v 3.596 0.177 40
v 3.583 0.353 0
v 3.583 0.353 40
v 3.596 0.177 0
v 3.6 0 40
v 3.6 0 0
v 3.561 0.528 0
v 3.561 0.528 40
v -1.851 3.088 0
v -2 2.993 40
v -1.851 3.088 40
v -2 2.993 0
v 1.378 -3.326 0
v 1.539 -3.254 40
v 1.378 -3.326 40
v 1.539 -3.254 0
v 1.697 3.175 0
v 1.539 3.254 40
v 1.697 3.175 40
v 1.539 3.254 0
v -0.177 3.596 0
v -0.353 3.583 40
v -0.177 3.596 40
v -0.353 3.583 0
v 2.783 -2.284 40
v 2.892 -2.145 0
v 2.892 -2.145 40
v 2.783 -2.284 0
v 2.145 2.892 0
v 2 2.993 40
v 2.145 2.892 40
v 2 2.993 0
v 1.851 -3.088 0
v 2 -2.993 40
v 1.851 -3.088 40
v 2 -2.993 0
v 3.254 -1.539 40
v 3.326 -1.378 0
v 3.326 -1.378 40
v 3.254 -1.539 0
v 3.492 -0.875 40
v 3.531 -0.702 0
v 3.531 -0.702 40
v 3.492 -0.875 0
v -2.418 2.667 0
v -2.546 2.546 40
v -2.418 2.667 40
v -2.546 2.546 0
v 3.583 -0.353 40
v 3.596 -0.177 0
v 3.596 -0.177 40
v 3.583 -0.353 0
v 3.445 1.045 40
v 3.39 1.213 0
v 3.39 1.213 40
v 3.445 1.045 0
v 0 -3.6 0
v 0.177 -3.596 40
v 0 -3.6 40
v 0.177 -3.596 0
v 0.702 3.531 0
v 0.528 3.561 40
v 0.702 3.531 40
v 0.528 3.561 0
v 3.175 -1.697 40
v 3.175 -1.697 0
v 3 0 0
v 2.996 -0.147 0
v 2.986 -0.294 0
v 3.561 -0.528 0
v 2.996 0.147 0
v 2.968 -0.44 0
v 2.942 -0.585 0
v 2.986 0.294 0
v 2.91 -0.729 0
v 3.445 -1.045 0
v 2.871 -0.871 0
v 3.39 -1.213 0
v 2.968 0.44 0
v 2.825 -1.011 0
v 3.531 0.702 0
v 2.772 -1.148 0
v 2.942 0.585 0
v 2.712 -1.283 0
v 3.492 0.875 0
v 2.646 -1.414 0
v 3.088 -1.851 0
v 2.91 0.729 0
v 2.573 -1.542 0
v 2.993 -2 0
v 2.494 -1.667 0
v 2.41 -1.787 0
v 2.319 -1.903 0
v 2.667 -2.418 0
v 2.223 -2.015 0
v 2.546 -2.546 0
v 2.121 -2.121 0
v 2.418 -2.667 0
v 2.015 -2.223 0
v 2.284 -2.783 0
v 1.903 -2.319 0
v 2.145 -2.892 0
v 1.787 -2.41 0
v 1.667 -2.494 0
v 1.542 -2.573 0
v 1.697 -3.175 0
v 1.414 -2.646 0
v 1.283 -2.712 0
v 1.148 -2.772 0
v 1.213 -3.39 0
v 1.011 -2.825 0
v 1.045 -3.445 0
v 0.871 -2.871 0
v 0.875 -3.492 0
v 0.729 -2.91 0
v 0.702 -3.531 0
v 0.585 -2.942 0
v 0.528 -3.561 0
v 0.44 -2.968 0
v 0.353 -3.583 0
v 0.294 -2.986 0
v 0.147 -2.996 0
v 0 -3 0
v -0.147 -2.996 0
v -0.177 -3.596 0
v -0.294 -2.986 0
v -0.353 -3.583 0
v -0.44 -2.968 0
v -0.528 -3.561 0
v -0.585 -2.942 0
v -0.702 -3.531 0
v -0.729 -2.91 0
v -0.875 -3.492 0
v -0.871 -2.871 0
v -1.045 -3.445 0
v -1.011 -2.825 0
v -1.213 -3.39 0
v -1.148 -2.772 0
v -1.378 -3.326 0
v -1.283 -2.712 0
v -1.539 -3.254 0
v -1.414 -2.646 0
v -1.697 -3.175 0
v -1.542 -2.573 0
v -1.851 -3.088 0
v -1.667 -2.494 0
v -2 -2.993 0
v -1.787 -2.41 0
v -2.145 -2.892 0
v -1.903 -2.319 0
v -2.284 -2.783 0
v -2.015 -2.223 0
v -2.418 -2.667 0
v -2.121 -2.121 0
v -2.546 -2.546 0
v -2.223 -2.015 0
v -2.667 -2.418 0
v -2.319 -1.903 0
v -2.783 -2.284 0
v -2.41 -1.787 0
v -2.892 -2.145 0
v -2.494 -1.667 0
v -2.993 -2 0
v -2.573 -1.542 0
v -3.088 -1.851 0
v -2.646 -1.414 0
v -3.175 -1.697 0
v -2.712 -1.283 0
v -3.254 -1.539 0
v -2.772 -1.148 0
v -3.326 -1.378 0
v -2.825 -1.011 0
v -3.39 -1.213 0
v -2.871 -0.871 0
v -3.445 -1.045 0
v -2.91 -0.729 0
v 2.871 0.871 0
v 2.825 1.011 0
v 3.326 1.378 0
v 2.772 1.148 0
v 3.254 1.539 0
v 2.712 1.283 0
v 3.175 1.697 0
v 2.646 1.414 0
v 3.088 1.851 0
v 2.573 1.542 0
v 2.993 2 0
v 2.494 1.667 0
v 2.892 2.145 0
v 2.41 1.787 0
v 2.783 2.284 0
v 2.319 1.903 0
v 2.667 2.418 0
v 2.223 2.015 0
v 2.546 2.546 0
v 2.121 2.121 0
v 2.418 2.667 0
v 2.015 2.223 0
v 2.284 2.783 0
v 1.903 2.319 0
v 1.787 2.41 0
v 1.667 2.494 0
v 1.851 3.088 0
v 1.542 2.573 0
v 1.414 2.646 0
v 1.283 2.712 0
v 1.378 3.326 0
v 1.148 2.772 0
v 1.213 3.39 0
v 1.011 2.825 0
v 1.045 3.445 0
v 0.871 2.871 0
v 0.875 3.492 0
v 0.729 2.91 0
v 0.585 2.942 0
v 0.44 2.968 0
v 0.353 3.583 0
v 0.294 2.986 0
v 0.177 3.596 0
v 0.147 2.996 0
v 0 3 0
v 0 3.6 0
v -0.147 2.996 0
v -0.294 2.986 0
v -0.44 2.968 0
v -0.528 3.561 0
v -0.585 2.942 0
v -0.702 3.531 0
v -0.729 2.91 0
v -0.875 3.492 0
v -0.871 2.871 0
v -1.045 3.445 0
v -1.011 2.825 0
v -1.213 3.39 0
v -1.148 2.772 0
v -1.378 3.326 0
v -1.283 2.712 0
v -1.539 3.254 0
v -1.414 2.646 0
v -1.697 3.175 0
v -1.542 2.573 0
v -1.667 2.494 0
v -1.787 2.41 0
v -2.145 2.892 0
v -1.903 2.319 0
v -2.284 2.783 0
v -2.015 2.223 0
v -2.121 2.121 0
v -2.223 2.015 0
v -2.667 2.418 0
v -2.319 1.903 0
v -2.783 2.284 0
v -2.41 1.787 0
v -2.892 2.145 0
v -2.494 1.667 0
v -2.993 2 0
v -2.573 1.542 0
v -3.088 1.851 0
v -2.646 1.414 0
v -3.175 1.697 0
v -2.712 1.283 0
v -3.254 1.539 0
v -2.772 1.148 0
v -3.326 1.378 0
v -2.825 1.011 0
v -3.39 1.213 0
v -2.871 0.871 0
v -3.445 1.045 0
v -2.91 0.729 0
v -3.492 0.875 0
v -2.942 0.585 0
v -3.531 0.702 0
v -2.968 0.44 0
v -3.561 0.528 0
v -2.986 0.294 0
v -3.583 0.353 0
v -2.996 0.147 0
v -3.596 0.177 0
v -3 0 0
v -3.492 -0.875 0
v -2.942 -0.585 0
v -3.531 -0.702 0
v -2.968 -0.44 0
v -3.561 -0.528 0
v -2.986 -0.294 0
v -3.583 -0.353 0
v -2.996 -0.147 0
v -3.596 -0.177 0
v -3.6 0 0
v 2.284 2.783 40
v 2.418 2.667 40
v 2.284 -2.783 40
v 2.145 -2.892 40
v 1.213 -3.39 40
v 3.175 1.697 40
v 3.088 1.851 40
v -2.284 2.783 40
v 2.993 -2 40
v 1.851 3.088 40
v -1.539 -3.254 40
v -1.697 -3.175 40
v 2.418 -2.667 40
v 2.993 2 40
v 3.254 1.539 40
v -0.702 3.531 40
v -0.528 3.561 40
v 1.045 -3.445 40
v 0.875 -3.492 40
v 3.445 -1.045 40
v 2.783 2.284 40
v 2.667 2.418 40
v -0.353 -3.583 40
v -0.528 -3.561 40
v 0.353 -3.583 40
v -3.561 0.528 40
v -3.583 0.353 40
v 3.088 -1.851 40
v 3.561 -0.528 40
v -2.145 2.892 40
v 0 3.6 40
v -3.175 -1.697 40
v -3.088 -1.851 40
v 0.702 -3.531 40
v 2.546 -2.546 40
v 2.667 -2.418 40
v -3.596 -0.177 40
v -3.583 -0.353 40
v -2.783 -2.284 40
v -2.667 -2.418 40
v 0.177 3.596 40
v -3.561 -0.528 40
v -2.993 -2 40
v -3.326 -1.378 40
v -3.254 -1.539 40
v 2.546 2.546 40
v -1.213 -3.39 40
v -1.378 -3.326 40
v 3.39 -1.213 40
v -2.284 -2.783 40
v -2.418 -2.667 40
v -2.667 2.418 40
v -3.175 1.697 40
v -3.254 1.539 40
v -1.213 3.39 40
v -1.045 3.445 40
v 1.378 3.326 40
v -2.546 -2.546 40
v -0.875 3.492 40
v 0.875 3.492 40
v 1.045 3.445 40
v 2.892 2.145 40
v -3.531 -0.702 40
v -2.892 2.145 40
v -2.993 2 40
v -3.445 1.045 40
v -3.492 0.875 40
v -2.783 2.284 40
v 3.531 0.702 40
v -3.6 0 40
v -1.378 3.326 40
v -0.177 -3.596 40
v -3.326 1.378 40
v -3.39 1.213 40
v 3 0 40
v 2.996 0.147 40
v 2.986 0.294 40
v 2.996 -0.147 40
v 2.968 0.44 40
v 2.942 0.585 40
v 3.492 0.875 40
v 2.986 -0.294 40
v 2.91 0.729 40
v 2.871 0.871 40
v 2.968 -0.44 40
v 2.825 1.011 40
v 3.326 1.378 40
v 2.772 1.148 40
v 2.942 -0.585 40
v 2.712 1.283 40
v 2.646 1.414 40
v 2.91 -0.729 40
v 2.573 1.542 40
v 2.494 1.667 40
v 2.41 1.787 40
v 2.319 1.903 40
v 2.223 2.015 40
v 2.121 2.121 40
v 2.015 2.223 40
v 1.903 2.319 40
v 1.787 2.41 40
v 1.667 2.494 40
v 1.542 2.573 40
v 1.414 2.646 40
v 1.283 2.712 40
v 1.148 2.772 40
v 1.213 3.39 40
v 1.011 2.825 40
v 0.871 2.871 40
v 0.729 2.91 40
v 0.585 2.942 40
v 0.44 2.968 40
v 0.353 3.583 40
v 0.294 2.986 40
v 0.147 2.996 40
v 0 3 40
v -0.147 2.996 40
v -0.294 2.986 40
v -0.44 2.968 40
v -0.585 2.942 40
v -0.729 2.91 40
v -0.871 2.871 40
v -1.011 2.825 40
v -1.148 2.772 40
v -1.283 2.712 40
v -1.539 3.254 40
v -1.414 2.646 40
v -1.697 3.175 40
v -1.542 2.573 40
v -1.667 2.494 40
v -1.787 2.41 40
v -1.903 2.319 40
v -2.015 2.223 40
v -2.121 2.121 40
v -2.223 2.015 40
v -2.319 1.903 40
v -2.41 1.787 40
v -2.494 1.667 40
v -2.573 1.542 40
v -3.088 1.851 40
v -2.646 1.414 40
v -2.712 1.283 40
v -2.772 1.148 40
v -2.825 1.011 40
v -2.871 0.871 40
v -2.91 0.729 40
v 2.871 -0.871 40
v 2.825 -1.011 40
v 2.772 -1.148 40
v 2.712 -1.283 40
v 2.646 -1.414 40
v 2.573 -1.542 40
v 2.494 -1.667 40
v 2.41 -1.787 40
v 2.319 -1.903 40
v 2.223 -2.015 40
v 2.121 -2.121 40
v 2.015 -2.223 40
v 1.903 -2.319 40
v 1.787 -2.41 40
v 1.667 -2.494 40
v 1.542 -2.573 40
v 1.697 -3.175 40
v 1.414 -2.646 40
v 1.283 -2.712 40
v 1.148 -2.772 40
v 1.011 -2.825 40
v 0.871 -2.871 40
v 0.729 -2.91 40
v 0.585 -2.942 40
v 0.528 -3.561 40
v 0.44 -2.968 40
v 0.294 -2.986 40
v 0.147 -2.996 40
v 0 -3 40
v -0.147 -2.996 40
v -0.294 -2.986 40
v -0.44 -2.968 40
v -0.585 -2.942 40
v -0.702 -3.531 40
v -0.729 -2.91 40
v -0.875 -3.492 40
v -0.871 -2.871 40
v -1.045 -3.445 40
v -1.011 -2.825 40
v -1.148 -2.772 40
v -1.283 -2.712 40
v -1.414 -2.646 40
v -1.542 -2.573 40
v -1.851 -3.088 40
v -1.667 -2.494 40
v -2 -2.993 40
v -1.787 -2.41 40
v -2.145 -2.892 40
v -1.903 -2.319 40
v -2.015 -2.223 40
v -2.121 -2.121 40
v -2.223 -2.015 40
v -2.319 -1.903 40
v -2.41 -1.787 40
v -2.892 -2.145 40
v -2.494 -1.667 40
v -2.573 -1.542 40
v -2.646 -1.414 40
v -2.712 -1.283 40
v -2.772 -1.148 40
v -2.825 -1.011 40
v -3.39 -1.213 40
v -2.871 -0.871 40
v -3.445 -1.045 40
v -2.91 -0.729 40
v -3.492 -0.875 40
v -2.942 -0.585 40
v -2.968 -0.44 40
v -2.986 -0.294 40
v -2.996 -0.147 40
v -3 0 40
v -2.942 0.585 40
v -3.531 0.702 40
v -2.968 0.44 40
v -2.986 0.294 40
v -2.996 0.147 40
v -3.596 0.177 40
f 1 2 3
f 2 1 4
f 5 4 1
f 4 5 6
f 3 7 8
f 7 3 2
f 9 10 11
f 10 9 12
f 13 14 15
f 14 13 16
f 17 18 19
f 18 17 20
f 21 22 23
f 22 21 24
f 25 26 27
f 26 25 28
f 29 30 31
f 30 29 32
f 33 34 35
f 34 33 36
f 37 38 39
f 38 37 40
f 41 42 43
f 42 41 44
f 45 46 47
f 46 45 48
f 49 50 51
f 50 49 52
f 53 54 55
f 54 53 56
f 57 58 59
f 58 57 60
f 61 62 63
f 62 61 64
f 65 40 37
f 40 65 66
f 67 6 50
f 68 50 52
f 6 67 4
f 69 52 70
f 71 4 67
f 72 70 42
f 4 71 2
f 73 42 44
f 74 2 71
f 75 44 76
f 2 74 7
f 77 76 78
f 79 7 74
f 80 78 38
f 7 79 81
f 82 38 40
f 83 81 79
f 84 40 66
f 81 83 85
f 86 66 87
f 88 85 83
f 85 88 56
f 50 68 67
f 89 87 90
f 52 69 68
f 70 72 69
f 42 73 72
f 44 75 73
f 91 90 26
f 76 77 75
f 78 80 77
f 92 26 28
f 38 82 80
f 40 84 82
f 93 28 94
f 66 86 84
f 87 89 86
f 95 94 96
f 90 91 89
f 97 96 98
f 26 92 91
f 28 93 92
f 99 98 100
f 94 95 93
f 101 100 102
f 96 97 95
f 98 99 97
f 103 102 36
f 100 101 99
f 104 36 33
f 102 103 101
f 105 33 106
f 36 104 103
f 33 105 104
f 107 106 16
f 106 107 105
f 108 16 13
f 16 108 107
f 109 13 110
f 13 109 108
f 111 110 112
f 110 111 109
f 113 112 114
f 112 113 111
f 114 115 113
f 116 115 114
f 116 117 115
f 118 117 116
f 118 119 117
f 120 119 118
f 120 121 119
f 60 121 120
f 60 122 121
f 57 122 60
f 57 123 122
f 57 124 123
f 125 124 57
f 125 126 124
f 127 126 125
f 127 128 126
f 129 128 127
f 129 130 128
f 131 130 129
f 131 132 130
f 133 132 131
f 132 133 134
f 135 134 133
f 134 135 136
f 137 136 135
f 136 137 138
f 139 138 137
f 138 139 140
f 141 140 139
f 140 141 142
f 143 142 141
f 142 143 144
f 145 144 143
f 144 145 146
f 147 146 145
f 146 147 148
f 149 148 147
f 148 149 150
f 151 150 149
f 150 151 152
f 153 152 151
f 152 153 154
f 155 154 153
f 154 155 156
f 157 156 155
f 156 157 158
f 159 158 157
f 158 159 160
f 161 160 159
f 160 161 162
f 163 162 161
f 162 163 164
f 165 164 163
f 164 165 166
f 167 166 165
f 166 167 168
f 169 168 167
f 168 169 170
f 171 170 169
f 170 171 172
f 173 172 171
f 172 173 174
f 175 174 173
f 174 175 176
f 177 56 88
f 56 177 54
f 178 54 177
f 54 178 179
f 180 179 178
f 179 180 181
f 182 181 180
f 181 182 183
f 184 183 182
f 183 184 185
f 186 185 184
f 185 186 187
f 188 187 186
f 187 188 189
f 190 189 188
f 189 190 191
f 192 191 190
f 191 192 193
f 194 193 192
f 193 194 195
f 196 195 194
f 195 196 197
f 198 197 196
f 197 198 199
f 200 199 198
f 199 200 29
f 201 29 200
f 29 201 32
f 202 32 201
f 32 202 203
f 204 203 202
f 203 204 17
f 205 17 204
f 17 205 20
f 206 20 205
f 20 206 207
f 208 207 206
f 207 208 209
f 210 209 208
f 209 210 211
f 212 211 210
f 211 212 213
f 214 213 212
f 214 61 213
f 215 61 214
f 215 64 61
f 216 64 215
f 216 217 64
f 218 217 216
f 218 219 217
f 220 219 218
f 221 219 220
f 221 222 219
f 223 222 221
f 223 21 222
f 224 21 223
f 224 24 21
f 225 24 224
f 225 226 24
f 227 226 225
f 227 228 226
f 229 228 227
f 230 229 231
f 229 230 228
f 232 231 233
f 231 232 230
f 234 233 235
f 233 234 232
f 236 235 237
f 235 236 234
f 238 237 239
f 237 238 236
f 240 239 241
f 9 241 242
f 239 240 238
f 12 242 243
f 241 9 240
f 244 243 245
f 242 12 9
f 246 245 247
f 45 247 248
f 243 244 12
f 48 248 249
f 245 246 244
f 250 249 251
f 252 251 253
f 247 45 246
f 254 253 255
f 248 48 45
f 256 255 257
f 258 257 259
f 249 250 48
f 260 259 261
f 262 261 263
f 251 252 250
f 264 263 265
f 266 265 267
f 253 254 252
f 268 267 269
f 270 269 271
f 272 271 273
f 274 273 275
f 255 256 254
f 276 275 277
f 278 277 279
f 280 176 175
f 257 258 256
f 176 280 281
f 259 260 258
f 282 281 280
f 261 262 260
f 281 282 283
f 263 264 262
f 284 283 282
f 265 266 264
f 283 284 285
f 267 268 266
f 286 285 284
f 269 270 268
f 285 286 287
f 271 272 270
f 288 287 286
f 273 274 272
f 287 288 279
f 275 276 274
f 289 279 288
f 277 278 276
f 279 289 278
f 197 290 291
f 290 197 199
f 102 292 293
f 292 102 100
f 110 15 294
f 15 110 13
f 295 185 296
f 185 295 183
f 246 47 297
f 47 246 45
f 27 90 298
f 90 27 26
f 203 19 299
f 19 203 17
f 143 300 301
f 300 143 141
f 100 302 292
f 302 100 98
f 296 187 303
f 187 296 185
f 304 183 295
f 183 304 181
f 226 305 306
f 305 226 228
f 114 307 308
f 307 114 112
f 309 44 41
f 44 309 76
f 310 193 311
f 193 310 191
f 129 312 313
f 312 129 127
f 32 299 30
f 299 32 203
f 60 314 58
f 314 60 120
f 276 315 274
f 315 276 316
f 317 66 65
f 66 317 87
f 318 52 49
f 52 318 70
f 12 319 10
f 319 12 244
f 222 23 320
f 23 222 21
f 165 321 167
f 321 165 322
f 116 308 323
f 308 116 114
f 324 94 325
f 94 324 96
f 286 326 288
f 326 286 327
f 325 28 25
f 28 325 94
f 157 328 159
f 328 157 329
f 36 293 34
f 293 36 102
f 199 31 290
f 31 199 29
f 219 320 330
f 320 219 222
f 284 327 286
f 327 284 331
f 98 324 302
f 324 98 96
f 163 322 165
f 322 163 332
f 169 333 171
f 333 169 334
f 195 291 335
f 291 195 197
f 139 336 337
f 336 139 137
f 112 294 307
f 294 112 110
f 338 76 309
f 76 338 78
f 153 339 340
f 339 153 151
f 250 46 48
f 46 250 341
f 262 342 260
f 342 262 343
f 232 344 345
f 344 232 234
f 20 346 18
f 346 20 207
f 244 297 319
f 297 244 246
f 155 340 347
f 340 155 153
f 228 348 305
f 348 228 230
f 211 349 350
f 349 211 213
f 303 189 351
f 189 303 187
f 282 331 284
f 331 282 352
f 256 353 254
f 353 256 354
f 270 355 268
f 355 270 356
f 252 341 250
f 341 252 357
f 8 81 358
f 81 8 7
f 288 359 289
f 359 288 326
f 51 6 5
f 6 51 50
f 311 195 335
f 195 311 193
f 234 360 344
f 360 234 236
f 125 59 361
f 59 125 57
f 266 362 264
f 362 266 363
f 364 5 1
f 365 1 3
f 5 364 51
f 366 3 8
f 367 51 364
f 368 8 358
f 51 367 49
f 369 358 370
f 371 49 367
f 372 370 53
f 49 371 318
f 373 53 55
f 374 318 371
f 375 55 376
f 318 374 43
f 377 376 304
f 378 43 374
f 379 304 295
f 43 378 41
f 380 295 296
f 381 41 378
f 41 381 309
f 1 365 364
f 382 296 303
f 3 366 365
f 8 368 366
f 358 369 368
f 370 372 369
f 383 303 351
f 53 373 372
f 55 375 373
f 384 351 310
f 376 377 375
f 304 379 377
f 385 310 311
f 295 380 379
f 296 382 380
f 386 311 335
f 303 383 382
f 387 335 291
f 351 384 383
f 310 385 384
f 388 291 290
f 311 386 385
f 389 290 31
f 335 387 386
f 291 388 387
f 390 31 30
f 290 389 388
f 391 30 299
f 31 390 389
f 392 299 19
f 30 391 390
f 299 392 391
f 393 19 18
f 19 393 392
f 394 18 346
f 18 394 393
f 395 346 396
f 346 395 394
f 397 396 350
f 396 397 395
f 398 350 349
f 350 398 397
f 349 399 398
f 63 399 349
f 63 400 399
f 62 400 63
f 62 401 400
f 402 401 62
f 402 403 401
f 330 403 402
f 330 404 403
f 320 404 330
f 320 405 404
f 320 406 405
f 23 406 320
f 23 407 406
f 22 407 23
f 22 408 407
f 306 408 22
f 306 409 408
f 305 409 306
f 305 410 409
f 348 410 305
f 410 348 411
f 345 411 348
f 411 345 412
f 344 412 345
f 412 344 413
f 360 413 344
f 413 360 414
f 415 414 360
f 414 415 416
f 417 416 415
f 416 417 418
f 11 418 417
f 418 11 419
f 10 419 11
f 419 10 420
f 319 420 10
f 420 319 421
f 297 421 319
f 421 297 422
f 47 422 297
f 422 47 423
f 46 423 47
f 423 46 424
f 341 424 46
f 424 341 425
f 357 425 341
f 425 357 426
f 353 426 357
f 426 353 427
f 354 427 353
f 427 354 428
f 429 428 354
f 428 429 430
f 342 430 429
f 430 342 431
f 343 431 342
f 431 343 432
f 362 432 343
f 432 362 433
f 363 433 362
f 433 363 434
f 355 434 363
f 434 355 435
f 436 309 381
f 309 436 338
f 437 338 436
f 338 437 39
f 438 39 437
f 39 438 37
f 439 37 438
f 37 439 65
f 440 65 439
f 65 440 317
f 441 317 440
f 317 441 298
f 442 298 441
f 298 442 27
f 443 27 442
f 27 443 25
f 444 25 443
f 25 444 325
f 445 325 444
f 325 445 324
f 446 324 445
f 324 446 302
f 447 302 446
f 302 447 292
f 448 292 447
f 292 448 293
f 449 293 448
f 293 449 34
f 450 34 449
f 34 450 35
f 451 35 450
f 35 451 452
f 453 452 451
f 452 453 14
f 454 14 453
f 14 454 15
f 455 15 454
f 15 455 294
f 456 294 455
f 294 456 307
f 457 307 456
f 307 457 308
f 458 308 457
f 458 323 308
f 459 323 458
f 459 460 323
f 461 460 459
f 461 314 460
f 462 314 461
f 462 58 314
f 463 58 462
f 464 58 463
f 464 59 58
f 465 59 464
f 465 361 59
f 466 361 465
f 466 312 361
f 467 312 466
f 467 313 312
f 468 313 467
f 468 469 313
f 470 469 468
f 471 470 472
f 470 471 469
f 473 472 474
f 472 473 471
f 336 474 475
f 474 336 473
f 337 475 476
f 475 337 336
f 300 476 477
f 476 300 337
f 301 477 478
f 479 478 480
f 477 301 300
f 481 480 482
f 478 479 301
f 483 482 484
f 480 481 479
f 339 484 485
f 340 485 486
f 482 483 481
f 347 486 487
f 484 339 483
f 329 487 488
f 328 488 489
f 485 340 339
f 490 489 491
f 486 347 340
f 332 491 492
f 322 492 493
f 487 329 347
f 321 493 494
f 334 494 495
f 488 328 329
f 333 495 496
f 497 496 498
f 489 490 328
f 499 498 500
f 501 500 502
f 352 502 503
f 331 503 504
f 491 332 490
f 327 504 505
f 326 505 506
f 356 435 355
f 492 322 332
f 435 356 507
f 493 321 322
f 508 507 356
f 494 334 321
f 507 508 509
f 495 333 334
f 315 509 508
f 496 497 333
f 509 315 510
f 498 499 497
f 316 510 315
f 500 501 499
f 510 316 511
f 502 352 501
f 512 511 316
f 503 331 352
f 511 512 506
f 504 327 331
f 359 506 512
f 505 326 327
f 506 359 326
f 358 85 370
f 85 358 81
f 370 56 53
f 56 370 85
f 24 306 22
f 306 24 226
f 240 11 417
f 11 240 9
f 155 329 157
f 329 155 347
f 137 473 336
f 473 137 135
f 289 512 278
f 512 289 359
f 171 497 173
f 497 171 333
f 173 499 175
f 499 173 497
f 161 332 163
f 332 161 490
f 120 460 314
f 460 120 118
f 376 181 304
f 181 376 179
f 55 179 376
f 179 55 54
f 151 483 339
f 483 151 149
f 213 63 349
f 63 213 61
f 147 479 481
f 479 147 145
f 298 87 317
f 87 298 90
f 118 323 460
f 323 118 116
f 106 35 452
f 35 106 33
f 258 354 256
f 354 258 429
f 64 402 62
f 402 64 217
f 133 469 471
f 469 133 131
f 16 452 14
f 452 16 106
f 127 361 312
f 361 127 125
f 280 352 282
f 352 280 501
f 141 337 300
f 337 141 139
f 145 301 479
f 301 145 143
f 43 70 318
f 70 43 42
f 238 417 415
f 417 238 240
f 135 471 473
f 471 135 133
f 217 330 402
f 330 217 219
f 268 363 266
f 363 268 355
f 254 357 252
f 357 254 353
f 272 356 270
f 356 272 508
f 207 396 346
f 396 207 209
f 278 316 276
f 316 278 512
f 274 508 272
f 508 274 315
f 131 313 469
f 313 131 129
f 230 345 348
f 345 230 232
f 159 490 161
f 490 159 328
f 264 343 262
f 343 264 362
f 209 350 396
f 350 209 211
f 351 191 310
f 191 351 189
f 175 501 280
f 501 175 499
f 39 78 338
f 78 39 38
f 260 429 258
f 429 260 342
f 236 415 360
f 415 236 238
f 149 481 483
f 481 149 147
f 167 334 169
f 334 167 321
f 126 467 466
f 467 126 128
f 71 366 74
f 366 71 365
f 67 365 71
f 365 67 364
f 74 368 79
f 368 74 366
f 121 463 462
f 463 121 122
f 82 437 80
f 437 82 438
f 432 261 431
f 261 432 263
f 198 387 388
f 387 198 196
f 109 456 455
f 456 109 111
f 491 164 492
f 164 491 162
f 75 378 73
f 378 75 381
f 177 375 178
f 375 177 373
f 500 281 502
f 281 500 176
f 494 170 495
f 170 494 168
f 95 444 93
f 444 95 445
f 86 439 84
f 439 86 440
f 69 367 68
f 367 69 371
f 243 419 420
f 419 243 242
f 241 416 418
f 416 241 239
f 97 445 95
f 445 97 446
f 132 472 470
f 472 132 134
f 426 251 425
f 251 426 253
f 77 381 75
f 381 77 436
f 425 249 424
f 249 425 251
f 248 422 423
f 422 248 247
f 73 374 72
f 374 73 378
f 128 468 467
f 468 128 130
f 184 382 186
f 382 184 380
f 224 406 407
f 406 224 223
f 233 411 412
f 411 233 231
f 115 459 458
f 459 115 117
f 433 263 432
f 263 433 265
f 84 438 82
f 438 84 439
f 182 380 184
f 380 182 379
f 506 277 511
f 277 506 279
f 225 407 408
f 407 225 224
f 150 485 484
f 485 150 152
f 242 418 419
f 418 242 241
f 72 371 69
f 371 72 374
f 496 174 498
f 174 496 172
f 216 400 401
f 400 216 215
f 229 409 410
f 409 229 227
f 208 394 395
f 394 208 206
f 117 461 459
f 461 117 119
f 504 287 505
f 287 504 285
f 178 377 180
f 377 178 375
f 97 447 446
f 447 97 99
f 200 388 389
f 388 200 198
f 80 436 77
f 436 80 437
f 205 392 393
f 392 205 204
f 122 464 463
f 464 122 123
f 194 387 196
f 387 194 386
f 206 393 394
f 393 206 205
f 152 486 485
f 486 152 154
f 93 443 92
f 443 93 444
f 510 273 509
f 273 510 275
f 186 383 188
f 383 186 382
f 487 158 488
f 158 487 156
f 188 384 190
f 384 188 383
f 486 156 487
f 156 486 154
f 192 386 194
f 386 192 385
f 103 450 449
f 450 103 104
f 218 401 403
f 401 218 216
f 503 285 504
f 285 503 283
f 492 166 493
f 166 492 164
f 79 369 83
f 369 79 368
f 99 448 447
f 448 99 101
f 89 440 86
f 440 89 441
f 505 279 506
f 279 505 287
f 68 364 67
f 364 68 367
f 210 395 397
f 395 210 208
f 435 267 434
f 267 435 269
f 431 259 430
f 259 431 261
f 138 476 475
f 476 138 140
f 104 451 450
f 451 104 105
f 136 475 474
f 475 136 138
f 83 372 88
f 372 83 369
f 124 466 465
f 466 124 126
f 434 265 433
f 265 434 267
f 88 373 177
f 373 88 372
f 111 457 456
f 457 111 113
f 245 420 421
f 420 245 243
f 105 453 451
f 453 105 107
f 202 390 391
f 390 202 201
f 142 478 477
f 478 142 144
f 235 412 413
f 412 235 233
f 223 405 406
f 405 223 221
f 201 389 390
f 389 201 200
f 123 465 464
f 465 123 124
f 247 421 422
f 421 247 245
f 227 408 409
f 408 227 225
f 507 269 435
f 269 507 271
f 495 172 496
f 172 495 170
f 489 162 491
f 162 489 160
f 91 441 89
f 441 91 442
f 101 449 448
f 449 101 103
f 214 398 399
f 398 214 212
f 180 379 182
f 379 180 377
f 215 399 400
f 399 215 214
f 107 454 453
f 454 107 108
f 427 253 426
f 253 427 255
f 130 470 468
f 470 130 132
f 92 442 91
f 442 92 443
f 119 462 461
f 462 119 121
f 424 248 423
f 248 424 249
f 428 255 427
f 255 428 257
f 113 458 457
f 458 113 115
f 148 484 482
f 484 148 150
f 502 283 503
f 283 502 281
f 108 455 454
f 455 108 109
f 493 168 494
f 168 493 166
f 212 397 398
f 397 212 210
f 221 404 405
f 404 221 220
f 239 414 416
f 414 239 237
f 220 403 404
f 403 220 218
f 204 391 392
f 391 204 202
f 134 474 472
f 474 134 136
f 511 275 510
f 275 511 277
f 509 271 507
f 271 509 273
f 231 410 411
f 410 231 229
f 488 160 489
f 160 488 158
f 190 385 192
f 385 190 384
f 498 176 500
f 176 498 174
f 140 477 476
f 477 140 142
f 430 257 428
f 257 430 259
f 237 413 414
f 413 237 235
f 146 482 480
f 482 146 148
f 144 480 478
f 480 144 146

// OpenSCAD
$fn = 128;

// Heatshrink sleeving (tubing)
inner_d = 6;          // inner diameter (mm)
wall = 0.6;           // wall thickness (mm)
length = 40;          // length (mm)

outer_d = inner_d + 2*wall;

module heatshrink_sleeve(id=6, wall=0.6, len=40) {
    od = id + 2*wall;
    difference() {
        cylinder(h=len, d=od, center=false);
        translate([0,0,-0.2])
            cylinder(h=len+0.4, d=id, center=false);
    }
}

heatshrink_sleeve(inner_d, wall, length);
